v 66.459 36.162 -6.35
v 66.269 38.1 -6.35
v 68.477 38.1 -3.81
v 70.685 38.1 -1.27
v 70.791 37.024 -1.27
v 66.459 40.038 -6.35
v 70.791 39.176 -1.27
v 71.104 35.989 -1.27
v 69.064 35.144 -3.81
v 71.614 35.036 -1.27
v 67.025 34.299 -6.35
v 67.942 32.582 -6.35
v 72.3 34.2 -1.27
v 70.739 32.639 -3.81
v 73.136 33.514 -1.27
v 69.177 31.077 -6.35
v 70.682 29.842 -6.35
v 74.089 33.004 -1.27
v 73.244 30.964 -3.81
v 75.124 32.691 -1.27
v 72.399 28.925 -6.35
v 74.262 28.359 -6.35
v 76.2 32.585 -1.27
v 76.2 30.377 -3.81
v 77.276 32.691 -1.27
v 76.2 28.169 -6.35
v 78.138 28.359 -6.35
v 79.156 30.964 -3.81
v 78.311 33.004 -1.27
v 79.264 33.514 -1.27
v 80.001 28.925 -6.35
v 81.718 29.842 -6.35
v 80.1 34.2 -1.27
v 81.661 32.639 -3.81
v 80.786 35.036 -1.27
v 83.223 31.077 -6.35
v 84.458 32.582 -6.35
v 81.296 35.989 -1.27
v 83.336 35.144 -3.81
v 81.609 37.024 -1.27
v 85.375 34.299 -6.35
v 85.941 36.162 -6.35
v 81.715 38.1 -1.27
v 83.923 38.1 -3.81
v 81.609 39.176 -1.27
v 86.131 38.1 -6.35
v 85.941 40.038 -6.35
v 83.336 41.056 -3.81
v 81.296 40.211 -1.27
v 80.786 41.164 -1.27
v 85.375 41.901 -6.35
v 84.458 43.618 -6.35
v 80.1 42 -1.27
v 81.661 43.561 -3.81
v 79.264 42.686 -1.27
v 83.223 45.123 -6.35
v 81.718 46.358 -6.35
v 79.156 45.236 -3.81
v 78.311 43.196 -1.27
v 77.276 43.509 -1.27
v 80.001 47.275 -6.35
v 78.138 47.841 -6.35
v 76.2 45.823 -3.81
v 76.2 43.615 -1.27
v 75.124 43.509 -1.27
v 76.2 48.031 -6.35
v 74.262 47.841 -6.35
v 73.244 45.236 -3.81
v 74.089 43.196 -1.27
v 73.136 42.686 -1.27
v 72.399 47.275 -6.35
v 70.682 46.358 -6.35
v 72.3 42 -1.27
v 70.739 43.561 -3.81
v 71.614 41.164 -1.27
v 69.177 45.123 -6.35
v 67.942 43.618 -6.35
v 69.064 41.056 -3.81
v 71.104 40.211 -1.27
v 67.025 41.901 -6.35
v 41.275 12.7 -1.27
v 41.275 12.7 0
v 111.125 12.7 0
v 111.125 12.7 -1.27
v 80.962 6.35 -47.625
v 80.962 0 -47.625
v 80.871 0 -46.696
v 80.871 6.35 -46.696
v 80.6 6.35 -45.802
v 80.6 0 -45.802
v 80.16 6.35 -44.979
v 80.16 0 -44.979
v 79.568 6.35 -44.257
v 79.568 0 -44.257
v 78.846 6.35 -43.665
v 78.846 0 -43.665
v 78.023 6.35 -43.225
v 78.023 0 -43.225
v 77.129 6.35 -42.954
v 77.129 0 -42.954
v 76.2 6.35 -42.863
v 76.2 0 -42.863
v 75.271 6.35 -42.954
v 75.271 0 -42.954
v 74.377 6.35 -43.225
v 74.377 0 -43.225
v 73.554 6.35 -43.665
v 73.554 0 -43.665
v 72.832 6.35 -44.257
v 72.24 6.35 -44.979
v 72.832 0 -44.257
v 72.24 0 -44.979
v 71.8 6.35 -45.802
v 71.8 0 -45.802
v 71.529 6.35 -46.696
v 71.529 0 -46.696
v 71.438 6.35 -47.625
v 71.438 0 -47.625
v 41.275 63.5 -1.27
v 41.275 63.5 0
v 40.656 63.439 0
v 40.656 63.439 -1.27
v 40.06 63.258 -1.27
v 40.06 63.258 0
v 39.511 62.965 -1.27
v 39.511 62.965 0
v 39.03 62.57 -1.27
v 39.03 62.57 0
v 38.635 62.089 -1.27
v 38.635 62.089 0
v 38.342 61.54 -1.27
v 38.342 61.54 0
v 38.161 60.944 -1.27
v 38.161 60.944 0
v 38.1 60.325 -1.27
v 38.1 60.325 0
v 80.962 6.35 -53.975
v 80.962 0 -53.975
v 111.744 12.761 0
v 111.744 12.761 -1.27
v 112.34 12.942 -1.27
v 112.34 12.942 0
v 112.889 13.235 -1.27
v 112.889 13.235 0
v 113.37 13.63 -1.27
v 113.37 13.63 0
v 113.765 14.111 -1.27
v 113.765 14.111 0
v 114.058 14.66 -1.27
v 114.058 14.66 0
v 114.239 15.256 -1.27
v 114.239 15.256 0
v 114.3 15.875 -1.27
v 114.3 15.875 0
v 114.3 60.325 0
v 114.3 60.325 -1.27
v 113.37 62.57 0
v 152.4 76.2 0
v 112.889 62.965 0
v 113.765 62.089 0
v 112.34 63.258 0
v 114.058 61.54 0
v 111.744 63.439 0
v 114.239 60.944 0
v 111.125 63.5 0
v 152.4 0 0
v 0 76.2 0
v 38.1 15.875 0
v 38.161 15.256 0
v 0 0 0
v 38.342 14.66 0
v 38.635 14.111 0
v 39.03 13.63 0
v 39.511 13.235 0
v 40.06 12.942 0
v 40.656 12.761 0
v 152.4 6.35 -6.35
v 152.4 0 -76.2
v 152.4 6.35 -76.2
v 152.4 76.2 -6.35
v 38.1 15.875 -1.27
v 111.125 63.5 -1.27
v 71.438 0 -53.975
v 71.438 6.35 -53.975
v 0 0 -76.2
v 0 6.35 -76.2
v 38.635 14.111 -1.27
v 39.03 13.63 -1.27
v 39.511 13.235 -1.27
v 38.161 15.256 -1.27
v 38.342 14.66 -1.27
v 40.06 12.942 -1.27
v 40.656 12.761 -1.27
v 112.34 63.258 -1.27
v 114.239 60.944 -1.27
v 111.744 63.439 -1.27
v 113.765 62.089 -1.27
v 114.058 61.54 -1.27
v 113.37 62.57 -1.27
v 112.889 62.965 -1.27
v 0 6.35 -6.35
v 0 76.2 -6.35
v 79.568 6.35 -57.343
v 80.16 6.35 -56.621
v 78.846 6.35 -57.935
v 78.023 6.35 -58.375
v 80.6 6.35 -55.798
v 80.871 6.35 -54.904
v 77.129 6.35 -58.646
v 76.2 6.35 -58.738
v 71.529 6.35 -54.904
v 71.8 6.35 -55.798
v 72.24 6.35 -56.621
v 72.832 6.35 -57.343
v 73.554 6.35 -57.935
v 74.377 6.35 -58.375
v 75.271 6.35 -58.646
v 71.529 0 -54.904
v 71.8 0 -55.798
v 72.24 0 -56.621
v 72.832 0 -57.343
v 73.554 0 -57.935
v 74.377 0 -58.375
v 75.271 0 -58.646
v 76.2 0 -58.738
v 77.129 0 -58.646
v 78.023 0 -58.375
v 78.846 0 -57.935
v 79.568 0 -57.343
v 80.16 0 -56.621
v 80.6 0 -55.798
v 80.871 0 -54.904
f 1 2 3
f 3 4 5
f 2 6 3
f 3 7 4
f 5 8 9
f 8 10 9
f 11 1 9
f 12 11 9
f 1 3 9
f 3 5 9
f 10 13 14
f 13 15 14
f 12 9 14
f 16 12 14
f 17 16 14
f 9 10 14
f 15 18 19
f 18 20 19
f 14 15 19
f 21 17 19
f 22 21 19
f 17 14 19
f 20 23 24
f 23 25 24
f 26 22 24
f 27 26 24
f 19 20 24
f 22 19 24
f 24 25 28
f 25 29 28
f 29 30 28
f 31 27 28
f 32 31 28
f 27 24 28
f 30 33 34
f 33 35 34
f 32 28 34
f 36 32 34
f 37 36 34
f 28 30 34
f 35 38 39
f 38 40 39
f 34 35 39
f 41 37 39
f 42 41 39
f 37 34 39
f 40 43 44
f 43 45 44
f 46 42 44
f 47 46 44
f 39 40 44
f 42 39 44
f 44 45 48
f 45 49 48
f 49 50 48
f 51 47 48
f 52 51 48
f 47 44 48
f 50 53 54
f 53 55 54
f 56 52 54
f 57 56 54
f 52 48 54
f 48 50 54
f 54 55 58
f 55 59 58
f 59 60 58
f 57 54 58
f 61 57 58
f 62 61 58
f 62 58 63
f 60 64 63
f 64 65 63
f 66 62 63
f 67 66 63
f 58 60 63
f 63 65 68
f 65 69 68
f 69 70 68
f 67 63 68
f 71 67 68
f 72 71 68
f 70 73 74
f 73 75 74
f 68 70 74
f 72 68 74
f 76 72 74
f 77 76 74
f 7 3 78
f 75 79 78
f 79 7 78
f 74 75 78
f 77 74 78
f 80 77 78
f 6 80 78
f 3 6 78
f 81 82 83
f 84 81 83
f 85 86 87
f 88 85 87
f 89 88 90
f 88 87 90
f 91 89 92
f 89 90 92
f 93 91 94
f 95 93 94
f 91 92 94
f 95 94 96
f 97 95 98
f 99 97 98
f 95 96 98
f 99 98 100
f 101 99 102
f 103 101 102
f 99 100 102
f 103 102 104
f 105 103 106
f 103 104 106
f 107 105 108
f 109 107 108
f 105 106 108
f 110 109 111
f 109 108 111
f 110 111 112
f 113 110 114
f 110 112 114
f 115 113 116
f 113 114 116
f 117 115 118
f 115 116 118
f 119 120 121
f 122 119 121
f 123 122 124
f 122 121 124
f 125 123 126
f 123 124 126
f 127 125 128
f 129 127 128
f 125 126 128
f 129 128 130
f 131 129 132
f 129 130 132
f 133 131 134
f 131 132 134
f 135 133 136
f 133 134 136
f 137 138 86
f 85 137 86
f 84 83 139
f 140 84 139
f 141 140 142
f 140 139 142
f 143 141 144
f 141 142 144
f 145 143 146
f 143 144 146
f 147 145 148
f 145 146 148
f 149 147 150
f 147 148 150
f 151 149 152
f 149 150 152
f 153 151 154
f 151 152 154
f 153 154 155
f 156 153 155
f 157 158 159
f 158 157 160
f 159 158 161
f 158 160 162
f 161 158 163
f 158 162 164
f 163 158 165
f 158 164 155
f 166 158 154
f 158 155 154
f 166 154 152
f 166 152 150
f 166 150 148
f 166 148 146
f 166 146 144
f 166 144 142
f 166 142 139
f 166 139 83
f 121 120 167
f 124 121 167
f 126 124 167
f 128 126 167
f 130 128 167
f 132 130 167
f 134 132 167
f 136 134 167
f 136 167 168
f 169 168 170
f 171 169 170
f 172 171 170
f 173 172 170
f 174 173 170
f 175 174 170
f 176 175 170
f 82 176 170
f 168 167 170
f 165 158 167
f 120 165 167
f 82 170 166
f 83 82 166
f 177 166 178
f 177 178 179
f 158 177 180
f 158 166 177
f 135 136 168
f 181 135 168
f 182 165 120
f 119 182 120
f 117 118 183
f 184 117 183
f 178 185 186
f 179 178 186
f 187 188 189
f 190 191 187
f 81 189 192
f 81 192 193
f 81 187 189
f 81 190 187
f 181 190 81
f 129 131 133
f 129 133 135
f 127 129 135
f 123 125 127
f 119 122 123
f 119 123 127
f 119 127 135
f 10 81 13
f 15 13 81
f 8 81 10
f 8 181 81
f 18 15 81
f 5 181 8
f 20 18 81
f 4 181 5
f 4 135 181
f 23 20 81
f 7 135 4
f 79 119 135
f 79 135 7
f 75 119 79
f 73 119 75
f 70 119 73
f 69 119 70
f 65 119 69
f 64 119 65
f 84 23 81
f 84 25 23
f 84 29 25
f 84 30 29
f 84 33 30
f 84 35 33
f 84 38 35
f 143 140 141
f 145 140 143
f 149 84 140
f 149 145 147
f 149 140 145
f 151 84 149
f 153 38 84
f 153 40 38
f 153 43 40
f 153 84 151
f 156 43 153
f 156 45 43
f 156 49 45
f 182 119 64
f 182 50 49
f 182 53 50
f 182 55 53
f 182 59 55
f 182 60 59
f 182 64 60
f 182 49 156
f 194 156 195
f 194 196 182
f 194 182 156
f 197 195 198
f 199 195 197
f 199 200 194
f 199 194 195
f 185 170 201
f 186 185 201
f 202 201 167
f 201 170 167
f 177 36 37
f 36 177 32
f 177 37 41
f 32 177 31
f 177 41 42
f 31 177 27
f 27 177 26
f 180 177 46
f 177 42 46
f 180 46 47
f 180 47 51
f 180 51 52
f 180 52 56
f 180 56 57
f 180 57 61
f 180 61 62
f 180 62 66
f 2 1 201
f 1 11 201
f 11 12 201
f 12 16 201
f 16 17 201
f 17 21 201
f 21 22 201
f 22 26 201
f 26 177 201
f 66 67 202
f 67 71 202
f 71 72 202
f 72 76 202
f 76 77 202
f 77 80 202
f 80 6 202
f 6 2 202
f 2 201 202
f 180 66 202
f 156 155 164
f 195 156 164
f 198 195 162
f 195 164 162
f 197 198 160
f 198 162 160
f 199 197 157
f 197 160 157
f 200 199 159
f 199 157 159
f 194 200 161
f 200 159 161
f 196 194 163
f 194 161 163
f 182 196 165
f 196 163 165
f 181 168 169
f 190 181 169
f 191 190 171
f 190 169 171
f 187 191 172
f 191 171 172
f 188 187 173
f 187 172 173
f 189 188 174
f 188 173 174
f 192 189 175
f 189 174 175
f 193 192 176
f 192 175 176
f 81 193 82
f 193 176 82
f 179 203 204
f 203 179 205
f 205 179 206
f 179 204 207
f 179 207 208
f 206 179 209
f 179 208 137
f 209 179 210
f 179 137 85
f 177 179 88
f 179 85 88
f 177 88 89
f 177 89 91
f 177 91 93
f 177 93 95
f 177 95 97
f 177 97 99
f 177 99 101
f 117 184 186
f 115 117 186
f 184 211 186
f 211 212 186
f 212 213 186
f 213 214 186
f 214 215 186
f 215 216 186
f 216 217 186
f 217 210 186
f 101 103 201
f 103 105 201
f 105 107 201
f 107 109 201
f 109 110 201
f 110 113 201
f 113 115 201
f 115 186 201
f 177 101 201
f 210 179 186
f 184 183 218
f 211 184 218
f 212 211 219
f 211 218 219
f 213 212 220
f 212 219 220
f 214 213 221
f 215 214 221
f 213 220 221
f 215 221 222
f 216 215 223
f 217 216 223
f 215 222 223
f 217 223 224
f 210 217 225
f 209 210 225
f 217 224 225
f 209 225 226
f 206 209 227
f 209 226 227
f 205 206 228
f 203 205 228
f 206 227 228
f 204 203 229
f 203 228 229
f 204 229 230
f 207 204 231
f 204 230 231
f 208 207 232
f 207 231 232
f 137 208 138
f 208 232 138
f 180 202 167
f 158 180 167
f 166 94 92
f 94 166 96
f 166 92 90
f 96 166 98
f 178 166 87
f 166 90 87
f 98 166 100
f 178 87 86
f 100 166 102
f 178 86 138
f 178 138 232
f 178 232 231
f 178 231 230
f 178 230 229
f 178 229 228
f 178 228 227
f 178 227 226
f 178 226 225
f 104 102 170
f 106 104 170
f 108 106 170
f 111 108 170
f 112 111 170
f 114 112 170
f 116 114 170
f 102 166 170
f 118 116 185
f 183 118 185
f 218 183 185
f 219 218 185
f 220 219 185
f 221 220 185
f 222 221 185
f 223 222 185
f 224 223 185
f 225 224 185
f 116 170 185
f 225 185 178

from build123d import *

# Parameters (mm, degrees)
F1_DEPTH       = 152.4
F3_D           = 9.525
F3_CSINK_D     = 19.8628
F3_CSINK_ANGLE = 82
F4_R           = 4.7625
F5_DEPTH       = 1.27
F7_DEPTH       = 76.201


# Not quite as in the source:
# - a length typed as a fraction of an inch, garbled in the dataset ("3 / 203.2 mm" for 3/8 in), is restored
# - a feature names something its author has since deleted; it is built from what else it names


with BuildPart() as f1:
    # F0 (on Right) → F1 (new body)
    with BuildSketch(Plane.YZ):
        Polygon((76.2, -6.35), (76.2, 0), (0, 0), (0, -76.2), (6.35, -76.2), (6.35, -6.35), align=None)
    extrude(amount=F1_DEPTH)

    # F3 (through all)
    with Locations(Plane(origin=(0, 0, -6.35), x_dir=(1, 0, 0), z_dir=(0, 0, -1))):
        with Locations((76.2, -38.1)):
            CounterSinkHole(F3_D / 2, F3_CSINK_D / 2, counter_sink_angle=F3_CSINK_ANGLE)

    # F4 (on face) → F5 (cut)
    with BuildSketch(Plane.XY):
        with BuildLine():
            Line((111.125, 63.5), (41.275, 63.5))
            ThreePointArc((41.275, 63.5), (39.0299359697, 62.5700640303), (38.1, 60.325))
            Line((38.1, 60.325), (38.1, 15.875))
            ThreePointArc((38.1, 15.875), (39.0299359697, 13.6299359697), (41.275, 12.7))
            Line((41.275, 12.7), (111.125, 12.7))
            ThreePointArc((111.125, 12.7), (113.3700640303, 13.6299359697), (114.3, 15.875))
            Line((114.3, 15.875), (114.3, 60.325))
            ThreePointArc((114.3, 60.325), (113.3700640303, 62.5700640303), (111.125, 63.5))
        make_face()
        with Locations((76.2, 38.1)):
            Circle(F4_R, mode=Mode.SUBTRACT)
    extrude(amount=-F5_DEPTH, mode=Mode.SUBTRACT)

    # F6 (on face) → F7 (cut, through all)
    with BuildSketch(Plane.XZ):
        with BuildLine():
            Line((71.4375, -47.625), (71.4375, -53.975))
            ThreePointArc((71.4375, -53.975), (76.2, -58.7375), (80.9625, -53.975))
            Line((80.9625, -53.975), (80.9625, -47.625))
            ThreePointArc((80.9625, -47.625), (76.2, -42.8625), (71.4375, -47.625))
        make_face()
    extrude(amount=-F7_DEPTH, mode=Mode.SUBTRACT)


solid = f1.part
